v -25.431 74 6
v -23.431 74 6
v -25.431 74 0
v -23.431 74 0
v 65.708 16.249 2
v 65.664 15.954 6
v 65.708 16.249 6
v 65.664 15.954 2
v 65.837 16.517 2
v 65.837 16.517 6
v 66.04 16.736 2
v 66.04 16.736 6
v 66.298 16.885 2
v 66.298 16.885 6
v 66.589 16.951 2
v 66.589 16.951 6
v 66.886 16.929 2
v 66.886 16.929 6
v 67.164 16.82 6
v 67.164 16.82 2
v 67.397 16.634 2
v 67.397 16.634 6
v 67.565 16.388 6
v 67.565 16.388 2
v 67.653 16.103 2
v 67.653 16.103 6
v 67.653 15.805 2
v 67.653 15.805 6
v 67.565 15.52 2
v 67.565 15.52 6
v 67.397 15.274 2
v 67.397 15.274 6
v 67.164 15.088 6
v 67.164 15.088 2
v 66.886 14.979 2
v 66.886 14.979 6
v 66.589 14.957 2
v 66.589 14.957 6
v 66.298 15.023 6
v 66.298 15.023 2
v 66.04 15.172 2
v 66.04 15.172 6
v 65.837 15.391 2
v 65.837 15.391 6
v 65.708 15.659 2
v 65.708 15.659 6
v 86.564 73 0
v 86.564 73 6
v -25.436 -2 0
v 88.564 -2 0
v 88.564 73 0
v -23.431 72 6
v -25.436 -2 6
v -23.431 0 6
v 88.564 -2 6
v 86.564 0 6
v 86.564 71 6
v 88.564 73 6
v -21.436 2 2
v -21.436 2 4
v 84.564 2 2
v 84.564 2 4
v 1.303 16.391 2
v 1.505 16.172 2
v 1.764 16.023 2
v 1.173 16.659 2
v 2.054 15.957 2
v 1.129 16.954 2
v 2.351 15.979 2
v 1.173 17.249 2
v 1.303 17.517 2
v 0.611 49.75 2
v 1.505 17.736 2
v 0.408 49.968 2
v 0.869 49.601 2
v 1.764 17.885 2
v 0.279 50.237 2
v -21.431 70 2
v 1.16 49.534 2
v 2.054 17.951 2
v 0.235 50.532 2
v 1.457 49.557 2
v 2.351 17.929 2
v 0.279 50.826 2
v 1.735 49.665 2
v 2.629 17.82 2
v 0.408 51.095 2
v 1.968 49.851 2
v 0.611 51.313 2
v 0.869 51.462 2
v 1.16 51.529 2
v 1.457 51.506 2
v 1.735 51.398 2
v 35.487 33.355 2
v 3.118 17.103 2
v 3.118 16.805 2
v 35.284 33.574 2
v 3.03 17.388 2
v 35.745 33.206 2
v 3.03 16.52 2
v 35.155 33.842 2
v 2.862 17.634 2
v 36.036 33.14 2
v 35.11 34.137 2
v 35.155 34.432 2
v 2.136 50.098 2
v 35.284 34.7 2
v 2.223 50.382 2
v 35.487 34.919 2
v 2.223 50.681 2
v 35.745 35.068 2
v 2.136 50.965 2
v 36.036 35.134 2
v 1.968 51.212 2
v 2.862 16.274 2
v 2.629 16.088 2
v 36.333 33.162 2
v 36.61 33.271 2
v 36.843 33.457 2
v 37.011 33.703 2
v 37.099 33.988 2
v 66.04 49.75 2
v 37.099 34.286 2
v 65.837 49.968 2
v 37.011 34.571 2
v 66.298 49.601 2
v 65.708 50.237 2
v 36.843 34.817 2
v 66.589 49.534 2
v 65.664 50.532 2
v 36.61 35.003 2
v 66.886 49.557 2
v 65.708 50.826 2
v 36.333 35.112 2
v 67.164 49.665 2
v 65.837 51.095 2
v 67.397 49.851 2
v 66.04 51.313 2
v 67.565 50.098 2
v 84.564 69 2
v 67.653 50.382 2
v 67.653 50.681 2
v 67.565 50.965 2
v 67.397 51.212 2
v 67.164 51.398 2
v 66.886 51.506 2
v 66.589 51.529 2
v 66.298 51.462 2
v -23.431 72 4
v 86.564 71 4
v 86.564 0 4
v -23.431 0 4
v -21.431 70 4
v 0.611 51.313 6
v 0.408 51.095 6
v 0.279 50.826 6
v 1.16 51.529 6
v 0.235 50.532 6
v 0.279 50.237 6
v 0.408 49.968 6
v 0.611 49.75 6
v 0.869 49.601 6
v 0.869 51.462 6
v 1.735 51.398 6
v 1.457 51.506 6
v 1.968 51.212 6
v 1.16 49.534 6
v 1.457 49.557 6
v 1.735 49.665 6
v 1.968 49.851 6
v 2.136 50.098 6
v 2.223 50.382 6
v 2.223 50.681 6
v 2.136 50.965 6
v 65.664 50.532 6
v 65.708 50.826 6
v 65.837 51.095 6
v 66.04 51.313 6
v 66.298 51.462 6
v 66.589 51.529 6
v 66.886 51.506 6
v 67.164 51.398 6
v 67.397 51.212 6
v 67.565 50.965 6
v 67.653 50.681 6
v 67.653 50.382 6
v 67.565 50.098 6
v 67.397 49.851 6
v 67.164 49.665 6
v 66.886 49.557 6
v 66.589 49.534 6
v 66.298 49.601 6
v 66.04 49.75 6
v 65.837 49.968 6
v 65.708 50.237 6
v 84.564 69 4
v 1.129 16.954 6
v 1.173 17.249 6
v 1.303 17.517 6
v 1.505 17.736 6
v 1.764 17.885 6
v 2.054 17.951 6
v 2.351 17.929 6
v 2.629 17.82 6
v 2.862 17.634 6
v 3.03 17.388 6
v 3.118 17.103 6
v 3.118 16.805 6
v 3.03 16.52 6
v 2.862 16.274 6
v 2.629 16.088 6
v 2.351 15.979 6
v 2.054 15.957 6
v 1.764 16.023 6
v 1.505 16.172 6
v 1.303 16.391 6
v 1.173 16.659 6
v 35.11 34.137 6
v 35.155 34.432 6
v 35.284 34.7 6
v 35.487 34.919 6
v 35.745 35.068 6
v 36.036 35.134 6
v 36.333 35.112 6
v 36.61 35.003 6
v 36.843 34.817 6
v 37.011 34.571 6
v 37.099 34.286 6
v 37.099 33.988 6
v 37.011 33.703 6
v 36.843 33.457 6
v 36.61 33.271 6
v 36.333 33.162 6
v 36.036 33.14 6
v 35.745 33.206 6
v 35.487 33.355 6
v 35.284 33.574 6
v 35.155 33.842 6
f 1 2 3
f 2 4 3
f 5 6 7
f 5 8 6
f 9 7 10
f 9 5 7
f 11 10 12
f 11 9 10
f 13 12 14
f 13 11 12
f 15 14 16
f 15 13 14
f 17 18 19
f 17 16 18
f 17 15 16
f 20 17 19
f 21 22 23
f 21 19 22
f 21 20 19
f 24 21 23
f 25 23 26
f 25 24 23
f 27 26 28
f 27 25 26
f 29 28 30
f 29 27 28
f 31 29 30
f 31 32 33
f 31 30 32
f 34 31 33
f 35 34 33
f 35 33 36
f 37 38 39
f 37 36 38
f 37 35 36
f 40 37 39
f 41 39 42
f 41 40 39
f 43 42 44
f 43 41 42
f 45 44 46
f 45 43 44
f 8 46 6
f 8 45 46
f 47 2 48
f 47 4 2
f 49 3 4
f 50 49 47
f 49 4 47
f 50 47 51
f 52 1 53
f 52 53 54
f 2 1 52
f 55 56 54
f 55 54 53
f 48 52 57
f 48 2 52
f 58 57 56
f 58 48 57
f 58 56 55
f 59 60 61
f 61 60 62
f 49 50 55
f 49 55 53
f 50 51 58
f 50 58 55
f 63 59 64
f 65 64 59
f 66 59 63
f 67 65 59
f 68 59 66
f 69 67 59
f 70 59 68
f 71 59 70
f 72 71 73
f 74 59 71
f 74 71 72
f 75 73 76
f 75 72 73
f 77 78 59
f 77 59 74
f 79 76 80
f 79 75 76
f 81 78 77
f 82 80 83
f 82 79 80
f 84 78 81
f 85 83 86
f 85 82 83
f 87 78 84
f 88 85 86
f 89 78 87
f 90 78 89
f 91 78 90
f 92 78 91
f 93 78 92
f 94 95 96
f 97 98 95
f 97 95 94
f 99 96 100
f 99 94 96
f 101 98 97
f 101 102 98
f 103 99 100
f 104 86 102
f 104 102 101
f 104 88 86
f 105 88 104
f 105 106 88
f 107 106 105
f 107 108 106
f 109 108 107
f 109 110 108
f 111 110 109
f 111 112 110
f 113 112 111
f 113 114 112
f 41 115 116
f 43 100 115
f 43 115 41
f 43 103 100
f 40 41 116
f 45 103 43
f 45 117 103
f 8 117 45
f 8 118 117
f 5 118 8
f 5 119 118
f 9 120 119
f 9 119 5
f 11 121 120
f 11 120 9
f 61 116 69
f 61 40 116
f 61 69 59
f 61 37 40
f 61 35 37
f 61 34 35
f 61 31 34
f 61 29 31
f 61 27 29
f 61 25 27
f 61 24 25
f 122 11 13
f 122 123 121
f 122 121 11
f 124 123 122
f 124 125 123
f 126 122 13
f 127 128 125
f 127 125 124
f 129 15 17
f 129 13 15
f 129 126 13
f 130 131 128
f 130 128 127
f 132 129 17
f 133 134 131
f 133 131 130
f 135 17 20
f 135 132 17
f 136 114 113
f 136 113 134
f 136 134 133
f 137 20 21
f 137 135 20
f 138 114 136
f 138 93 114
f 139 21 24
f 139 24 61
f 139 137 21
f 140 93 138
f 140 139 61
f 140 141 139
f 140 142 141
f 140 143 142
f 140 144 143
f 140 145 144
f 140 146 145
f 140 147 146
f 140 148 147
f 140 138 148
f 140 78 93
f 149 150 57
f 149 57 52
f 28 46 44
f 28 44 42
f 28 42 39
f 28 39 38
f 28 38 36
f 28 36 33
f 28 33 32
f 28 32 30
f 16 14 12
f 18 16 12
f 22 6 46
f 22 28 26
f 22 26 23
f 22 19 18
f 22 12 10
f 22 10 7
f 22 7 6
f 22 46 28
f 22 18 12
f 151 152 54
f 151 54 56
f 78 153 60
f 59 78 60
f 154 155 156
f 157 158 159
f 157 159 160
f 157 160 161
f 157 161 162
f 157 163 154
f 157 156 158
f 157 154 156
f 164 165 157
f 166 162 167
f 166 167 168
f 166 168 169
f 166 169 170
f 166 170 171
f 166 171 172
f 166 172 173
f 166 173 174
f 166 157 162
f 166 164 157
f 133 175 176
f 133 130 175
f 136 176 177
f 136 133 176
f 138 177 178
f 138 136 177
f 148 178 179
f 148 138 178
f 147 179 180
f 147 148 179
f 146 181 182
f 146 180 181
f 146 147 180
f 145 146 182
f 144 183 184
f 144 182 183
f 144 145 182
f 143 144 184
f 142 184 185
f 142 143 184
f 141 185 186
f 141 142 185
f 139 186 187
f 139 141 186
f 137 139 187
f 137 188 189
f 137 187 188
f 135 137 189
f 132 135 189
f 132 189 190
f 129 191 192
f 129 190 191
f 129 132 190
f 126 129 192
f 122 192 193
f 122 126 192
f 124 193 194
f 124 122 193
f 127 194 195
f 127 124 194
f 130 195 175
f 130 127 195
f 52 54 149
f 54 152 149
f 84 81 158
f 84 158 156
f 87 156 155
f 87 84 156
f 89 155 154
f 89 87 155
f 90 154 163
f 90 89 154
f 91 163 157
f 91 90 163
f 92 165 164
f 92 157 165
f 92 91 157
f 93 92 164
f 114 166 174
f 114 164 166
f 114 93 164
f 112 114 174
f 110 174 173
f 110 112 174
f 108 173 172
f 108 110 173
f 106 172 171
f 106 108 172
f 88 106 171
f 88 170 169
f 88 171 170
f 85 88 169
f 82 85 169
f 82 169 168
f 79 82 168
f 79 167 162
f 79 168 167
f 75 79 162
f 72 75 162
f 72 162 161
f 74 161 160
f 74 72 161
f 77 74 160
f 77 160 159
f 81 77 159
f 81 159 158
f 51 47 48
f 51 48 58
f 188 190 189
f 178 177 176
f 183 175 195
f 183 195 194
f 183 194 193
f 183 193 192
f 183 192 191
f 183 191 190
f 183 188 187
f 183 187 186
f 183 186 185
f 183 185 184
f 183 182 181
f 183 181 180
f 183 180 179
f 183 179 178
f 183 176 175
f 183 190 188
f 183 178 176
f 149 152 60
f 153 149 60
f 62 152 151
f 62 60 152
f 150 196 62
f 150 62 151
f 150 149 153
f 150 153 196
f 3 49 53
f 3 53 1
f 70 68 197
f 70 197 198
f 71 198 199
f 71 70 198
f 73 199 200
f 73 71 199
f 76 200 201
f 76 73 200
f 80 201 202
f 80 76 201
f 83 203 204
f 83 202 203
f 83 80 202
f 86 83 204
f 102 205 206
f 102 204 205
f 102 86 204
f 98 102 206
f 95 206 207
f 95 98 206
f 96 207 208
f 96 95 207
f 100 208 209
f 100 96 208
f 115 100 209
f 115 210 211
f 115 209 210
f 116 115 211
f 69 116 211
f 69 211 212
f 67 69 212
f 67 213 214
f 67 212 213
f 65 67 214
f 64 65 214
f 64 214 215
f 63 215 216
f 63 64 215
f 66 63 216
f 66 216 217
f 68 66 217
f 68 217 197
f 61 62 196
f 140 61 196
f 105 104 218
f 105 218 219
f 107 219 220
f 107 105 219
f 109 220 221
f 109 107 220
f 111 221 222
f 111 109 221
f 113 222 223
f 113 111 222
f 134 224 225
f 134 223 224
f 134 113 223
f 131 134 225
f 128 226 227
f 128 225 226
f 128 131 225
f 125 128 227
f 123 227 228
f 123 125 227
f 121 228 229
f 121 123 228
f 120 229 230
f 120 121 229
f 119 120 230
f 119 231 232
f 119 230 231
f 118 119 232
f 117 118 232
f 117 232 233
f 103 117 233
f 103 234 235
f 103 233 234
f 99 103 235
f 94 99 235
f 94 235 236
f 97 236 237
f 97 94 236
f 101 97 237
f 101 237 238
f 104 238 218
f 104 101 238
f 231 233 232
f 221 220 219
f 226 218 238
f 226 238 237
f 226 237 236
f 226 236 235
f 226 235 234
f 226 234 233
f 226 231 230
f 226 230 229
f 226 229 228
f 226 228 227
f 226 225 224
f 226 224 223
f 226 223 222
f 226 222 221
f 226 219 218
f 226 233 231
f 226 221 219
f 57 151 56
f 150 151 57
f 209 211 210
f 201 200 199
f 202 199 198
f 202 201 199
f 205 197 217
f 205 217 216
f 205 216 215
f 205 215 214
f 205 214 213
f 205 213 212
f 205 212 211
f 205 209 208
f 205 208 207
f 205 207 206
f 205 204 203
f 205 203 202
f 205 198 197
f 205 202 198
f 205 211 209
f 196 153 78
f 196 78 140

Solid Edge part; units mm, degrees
sketch "Sketch1" plane through (0, 0, 0) normal (0, 0, 1) x (1, 0, 0)
  line L0 (-23.4355, 0) -> (86.5645, 0)
  line L1 (86.5645, 0) -> (86.5645, 71)
  line L2 (-23.4309, 72) -> (86.5645, 71)
  line L3 (-23.4309, 72) -> (-23.4355, 0)
extrude "Protrusion1" add sketch "Sketch1" along normal blind 4
sketch "Sketch2" plane through (31.5645, 36, 4) normal (0, 0, 1) x (1, 0, 0)
  line L0 (-53, -34) -> (53, -34)
  line L1 (53, -34) -> (53, 33)
  line L2 (-52.9953, 34) -> (53, 33)
  line L3 (-52.9953, 34) -> (-53, -34)
extrude "ExtrudedCutout_1" cut sketch "Sketch2" against normal blind 2
sketch "Sketch3" plane through (31.5645, 36, 2) normal (0, 0, 1) x (-1, 0, 0)
  circle A0 centre (-35.0992, 20.046) radius 1
  circle A1 centre (-35.0992, -14.5315) radius 1
  circle A2 centre (-4.5458, 1.863) radius 1
  circle A3 centre (30.3299, -14.5315) radius 1
  circle A4 centre (29.4356, 19.046) radius 1
extrude "ExtrudedProtrusion_7" add sketch "Sketch3" along normal blind 4
sketch "Sketch4" plane through (0, 0, 0) normal (0, 0, 1) x (1, 0, 0)
  line L0 (-23.4309, 73.9825) -> (-23.4309, 74)
  line L1 (-23.4309, 74) -> (-25.4309, 74)
  line L2 (-25.4355, -2) -> (-25.4309, 74)
  line L3 (-23.4309, -2) -> (-25.4355, -2)
  line L4 (-23.4309, 72) -> (-23.4309, -2)
  line L5 (-23.4309, 72) -> (-23.4309, 73.9825)
extrude "ExtrudedProtrusion_8" add sketch "Sketch4" along normal blind 6
sketch "Sketch5" plane through (0, 0, 0) normal (0, 0, 1) x (1, 0, 0)
  line L0 (-23.4309, 0) -> (86.5645, 0)
  line L1 (86.5645, 0) -> (88.5645, 0)
  line L2 (88.5645, 0) -> (88.5645, -2)
  line L3 (88.5645, -2) -> (-23.4309, -2)
  line L4 (-23.4309, -2) -> (-23.4309, 0)
extrude "ExtrudedProtrusion_9" add sketch "Sketch5" along normal blind 6
sketch "Sketch6" plane through (0, 0, 0) normal (0, 0, 1) x (1, 0, 0)
  line L0 (86.5645, 0) -> (86.5645, 71)
  line L1 (86.5645, 71) -> (86.5645, 73)
  line L2 (86.5645, 73) -> (88.5645, 73)
  line L3 (88.5645, 73) -> (88.5645, 0)
  line L4 (88.5645, 0) -> (86.5645, 0)
extrude "ExtrudedProtrusion_10" add sketch "Sketch6" along normal blind 6
sketch "Sketch7" plane through (0, 0, 0) normal (0, 0, 1) x (1, 0, 0)
  line L0 (86.5645, 73) -> (86.5645, 71)
  line L1 (86.5645, 71) -> (-23.4309, 72)
  line L2 (-23.4309, 72) -> (-23.4309, 74)
  line L3 (-23.4309, 74) -> (86.5645, 73)
extrude "ExtrudedProtrusion_11" add sketch "Sketch7" along normal blind 6
